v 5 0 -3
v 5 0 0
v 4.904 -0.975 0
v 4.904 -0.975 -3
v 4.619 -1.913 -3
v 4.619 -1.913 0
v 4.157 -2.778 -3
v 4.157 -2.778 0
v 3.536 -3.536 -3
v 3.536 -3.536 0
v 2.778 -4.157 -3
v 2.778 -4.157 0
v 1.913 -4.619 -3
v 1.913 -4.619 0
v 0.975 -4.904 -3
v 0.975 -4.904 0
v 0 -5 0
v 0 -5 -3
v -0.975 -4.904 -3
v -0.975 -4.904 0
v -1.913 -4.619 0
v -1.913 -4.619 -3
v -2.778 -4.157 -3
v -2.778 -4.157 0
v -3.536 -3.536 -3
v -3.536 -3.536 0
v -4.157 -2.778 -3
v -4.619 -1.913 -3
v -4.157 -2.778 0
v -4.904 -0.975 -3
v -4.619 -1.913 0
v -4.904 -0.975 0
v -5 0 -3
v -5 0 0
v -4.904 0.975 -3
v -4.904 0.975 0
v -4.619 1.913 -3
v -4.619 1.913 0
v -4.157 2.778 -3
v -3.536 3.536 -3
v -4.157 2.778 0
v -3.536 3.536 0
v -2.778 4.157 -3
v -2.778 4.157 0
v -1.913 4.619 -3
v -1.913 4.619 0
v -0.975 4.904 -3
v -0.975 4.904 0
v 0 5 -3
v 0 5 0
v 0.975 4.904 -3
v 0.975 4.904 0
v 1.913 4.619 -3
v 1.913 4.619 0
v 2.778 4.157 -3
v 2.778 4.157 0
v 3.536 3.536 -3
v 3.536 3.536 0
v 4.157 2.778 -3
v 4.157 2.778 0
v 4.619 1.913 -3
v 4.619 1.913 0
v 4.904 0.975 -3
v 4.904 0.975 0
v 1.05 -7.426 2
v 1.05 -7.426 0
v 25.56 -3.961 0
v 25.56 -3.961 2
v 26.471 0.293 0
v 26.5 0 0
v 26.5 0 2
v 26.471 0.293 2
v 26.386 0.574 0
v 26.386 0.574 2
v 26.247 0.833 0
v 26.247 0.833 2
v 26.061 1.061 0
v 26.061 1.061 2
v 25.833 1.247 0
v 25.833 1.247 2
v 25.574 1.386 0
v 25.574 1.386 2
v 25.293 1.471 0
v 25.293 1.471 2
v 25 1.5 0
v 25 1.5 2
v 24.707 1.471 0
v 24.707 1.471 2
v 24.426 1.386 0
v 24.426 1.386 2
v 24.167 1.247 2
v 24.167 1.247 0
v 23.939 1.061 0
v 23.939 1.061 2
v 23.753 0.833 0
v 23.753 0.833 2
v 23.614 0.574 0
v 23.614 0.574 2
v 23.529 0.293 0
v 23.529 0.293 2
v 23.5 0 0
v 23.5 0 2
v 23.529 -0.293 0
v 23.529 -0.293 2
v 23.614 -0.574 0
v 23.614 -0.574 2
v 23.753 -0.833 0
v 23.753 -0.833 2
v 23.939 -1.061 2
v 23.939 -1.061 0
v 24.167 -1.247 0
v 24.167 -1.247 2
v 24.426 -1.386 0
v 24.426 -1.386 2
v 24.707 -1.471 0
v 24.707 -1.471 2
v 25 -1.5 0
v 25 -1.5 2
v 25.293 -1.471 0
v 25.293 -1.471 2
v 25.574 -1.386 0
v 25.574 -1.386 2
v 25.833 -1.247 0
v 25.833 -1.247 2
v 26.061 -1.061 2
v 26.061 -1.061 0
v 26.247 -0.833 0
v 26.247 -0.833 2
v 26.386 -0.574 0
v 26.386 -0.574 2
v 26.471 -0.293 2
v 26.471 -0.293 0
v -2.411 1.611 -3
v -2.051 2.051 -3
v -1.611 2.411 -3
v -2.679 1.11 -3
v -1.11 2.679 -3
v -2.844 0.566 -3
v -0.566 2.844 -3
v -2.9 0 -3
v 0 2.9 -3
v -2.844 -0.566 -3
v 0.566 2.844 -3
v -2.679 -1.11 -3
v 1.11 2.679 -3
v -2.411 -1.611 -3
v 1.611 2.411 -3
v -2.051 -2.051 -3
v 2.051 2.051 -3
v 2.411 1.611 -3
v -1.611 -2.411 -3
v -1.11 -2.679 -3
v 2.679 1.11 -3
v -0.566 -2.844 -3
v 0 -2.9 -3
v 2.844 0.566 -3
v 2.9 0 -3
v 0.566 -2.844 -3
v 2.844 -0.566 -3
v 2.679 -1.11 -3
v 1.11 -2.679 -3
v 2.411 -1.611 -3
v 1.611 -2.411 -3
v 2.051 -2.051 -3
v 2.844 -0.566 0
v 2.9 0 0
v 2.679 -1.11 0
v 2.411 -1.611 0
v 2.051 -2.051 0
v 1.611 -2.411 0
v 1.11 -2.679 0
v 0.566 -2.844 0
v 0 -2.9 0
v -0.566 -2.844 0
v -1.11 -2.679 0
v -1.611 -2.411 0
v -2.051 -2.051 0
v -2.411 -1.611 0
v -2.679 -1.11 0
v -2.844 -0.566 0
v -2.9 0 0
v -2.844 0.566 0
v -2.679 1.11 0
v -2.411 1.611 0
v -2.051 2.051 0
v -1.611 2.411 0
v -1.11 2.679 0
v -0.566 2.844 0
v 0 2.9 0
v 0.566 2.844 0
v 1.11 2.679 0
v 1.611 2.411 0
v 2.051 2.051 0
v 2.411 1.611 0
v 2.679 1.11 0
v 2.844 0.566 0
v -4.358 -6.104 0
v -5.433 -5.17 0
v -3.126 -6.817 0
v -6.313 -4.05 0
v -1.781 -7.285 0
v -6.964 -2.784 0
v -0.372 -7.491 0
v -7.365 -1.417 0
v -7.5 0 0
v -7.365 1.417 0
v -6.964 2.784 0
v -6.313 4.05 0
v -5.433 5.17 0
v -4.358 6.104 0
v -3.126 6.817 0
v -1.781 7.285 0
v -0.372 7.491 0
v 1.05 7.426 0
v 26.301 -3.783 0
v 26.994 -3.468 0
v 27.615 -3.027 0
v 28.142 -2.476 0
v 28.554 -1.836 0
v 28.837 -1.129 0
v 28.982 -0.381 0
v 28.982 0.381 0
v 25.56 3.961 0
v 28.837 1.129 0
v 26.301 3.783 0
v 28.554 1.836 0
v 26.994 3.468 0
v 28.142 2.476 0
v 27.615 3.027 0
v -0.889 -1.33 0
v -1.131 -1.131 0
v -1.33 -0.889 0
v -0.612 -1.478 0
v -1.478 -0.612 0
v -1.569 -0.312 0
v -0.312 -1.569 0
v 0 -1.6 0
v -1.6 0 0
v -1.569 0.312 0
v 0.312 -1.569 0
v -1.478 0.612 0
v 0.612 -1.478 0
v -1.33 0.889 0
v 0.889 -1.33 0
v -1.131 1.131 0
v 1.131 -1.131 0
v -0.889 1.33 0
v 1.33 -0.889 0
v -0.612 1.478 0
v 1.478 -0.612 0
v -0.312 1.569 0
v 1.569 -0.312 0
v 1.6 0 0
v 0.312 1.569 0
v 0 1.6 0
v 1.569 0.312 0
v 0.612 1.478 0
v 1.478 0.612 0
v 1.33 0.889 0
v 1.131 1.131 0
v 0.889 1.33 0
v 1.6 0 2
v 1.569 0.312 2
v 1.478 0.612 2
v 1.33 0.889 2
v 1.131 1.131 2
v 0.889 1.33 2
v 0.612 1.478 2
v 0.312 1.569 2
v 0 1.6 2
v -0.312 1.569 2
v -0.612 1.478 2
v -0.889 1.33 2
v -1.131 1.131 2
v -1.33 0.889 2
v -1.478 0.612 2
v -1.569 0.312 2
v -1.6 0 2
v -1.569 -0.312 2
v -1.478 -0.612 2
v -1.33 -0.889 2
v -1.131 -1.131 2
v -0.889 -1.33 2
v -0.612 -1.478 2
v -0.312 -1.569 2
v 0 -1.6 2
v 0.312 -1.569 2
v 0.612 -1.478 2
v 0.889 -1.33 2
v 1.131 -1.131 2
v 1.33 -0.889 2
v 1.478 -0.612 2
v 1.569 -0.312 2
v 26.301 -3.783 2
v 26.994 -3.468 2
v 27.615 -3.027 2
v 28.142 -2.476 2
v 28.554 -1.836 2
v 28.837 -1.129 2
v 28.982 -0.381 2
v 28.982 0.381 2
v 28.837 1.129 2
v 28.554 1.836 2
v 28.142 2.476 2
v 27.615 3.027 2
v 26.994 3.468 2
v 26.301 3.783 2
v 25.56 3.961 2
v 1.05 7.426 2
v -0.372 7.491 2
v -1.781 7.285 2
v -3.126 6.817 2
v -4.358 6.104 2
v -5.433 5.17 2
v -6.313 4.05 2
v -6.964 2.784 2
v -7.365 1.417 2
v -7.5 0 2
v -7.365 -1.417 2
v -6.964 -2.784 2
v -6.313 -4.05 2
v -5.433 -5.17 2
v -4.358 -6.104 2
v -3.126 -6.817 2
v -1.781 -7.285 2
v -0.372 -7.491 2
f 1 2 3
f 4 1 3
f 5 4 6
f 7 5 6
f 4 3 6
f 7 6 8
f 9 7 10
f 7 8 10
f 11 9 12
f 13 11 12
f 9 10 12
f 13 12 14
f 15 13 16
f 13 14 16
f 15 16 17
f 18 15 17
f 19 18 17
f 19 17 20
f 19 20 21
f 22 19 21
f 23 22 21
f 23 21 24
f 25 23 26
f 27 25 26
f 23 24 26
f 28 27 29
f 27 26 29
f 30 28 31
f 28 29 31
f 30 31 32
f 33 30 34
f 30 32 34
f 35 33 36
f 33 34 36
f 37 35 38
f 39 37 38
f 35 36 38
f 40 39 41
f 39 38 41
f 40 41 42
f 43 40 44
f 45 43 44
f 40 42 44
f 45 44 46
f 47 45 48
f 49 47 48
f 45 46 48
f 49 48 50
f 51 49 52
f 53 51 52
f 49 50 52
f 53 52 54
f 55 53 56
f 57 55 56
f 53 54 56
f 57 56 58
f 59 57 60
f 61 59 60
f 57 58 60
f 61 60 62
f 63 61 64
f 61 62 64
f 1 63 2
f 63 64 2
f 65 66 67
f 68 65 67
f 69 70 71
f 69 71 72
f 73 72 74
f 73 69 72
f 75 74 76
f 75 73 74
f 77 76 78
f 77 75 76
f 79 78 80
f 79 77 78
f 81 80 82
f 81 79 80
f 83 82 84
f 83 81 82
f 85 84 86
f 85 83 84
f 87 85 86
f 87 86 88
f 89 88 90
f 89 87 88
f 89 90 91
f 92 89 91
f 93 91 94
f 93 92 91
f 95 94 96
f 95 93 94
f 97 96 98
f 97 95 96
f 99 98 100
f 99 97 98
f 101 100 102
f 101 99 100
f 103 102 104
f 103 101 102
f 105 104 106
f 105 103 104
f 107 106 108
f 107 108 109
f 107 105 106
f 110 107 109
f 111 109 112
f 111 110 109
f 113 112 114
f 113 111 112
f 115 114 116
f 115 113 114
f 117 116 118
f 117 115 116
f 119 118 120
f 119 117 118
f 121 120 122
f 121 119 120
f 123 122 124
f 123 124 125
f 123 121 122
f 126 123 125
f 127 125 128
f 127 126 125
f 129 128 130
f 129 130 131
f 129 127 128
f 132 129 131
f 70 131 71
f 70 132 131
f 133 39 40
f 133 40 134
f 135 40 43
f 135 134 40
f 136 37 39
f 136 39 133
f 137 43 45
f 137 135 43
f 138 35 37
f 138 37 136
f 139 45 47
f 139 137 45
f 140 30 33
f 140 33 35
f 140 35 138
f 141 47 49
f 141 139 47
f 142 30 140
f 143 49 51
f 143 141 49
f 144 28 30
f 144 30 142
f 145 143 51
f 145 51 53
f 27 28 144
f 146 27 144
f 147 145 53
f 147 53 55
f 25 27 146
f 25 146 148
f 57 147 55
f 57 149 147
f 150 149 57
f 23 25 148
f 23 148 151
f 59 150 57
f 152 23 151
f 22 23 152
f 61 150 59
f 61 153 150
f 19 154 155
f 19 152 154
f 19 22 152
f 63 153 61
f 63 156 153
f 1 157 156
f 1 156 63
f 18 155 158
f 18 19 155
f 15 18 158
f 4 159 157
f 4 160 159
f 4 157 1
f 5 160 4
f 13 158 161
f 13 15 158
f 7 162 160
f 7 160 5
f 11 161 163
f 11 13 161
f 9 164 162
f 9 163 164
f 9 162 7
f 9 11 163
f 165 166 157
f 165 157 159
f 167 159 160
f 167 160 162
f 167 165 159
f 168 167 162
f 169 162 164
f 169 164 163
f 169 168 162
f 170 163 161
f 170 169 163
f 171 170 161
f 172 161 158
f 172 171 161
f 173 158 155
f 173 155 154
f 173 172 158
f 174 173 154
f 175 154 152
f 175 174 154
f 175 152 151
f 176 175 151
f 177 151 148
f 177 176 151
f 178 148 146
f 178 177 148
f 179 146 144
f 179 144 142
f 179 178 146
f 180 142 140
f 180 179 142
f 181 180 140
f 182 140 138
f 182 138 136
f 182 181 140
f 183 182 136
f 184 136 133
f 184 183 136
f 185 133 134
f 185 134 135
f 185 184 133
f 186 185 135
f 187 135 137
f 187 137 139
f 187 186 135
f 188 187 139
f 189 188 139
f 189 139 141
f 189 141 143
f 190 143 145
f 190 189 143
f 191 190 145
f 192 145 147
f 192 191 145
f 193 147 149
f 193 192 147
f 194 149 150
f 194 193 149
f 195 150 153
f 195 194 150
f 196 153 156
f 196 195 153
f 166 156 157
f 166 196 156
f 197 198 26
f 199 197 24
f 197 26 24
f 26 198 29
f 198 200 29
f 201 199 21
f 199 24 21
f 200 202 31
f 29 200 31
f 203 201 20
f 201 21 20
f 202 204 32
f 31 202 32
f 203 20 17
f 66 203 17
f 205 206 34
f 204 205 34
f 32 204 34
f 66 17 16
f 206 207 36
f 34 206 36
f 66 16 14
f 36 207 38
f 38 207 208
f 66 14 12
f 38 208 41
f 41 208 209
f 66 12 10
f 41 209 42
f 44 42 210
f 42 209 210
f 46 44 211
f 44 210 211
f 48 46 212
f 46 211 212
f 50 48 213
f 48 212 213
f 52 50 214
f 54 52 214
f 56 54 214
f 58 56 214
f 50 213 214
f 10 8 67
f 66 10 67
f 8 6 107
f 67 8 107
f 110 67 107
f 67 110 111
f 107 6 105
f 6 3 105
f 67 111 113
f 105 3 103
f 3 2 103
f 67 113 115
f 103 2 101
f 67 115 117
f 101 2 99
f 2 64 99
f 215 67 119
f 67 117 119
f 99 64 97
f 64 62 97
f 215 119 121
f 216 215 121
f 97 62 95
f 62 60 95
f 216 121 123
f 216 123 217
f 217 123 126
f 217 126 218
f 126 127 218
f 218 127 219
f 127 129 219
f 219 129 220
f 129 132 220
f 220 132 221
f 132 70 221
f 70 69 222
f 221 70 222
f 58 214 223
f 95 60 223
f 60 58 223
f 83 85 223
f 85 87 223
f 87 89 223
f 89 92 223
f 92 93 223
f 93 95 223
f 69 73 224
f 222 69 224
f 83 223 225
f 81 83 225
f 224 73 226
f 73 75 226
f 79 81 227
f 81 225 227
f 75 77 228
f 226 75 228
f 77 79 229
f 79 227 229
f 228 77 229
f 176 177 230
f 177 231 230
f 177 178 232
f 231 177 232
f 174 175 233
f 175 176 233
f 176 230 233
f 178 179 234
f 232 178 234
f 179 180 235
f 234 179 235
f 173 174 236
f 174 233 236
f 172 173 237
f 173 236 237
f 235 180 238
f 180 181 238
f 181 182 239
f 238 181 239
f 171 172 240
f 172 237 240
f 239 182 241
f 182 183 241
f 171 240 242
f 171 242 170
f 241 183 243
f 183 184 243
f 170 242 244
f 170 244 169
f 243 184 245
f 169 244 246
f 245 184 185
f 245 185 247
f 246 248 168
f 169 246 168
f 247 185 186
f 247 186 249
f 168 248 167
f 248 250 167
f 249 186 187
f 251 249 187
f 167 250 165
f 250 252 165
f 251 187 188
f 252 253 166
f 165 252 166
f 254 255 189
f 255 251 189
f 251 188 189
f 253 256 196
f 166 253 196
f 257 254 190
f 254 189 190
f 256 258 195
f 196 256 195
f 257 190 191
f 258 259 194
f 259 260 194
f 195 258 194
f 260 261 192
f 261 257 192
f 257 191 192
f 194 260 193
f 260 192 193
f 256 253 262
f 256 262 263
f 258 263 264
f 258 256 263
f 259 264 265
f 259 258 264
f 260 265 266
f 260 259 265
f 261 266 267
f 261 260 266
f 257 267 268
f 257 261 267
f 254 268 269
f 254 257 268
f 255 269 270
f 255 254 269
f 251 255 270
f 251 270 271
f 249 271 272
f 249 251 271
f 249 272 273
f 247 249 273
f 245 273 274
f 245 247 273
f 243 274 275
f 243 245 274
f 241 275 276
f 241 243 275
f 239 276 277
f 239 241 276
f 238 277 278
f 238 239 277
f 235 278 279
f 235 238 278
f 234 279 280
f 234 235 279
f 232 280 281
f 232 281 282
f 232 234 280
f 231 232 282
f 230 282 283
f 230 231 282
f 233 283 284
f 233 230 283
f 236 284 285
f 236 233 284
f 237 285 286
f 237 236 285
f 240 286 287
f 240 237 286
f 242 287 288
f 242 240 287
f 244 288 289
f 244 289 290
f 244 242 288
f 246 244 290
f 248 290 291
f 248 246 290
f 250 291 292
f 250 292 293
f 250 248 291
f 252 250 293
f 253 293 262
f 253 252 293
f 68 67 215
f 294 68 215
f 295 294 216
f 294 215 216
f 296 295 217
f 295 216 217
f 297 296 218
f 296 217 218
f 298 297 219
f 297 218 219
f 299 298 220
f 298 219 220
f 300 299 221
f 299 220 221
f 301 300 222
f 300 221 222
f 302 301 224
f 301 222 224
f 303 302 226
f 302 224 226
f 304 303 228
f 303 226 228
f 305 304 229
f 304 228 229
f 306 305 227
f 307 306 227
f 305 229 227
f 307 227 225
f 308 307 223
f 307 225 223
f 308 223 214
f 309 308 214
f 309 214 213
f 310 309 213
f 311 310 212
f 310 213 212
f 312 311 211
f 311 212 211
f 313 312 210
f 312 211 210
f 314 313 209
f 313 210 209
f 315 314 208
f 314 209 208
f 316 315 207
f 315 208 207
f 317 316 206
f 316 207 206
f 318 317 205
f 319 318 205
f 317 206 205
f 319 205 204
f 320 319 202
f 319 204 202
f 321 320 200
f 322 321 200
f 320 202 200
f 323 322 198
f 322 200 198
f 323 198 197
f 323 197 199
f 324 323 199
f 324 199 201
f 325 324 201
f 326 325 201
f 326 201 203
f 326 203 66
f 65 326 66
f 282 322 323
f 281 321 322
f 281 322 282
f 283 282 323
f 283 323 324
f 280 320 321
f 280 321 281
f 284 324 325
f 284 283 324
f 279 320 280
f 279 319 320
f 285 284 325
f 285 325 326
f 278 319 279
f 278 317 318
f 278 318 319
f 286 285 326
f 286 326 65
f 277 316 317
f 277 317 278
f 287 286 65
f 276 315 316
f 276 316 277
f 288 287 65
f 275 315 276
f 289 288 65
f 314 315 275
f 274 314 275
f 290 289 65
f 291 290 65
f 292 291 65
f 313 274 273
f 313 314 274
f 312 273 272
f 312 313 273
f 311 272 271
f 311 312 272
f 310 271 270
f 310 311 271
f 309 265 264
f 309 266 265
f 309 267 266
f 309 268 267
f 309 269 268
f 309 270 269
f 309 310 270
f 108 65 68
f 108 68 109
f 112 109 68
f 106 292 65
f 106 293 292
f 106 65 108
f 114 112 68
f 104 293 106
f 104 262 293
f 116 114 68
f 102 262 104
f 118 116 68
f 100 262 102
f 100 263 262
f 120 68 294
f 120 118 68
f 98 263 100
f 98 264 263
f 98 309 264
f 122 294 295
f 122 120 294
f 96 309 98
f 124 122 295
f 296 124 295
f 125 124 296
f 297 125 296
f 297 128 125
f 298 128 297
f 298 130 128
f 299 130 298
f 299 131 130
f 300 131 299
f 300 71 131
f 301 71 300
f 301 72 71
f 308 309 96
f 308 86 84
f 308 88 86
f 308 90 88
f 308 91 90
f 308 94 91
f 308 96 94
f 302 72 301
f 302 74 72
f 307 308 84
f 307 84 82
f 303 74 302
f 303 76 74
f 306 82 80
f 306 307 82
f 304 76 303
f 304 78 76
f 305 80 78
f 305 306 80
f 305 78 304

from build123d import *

# Parameters (mm, degrees)
F0_R     = 1.6
F0_R_2   = 1.5
F1_DEPTH = 2
F2_R     = 5
F2_R_2   = 2.9
F3_DEPTH = 3


with BuildPart() as f1:
    # F0 (on Top) → F1 (new body)
    with BuildSketch(Plane.XY):
        with BuildLine():
            Line((25.56, 3.960606), (1.05, 7.426136))
            ThreePointArc((1.05, 7.426136), (-7.5, 0), (1.05, -7.426136))
            Line((1.05, -7.426136), (25.56, -3.960606))
            ThreePointArc((25.56, -3.960606), (29, 0), (25.56, 3.960606))
        make_face()
        Circle(F0_R, mode=Mode.SUBTRACT)
        with Locations((25, 0)):
            Circle(F0_R_2, mode=Mode.SUBTRACT)
    extrude(amount=F1_DEPTH)

    # F2 (on face) → F3 (join)
    with BuildSketch(Plane(origin=(0, 0, 0), x_dir=(1, 0, 0), z_dir=(0, 0, -1))):
        Circle(F2_R)
        Circle(F2_R_2, mode=Mode.SUBTRACT)
    extrude(amount=F3_DEPTH)


solid = f1.part
